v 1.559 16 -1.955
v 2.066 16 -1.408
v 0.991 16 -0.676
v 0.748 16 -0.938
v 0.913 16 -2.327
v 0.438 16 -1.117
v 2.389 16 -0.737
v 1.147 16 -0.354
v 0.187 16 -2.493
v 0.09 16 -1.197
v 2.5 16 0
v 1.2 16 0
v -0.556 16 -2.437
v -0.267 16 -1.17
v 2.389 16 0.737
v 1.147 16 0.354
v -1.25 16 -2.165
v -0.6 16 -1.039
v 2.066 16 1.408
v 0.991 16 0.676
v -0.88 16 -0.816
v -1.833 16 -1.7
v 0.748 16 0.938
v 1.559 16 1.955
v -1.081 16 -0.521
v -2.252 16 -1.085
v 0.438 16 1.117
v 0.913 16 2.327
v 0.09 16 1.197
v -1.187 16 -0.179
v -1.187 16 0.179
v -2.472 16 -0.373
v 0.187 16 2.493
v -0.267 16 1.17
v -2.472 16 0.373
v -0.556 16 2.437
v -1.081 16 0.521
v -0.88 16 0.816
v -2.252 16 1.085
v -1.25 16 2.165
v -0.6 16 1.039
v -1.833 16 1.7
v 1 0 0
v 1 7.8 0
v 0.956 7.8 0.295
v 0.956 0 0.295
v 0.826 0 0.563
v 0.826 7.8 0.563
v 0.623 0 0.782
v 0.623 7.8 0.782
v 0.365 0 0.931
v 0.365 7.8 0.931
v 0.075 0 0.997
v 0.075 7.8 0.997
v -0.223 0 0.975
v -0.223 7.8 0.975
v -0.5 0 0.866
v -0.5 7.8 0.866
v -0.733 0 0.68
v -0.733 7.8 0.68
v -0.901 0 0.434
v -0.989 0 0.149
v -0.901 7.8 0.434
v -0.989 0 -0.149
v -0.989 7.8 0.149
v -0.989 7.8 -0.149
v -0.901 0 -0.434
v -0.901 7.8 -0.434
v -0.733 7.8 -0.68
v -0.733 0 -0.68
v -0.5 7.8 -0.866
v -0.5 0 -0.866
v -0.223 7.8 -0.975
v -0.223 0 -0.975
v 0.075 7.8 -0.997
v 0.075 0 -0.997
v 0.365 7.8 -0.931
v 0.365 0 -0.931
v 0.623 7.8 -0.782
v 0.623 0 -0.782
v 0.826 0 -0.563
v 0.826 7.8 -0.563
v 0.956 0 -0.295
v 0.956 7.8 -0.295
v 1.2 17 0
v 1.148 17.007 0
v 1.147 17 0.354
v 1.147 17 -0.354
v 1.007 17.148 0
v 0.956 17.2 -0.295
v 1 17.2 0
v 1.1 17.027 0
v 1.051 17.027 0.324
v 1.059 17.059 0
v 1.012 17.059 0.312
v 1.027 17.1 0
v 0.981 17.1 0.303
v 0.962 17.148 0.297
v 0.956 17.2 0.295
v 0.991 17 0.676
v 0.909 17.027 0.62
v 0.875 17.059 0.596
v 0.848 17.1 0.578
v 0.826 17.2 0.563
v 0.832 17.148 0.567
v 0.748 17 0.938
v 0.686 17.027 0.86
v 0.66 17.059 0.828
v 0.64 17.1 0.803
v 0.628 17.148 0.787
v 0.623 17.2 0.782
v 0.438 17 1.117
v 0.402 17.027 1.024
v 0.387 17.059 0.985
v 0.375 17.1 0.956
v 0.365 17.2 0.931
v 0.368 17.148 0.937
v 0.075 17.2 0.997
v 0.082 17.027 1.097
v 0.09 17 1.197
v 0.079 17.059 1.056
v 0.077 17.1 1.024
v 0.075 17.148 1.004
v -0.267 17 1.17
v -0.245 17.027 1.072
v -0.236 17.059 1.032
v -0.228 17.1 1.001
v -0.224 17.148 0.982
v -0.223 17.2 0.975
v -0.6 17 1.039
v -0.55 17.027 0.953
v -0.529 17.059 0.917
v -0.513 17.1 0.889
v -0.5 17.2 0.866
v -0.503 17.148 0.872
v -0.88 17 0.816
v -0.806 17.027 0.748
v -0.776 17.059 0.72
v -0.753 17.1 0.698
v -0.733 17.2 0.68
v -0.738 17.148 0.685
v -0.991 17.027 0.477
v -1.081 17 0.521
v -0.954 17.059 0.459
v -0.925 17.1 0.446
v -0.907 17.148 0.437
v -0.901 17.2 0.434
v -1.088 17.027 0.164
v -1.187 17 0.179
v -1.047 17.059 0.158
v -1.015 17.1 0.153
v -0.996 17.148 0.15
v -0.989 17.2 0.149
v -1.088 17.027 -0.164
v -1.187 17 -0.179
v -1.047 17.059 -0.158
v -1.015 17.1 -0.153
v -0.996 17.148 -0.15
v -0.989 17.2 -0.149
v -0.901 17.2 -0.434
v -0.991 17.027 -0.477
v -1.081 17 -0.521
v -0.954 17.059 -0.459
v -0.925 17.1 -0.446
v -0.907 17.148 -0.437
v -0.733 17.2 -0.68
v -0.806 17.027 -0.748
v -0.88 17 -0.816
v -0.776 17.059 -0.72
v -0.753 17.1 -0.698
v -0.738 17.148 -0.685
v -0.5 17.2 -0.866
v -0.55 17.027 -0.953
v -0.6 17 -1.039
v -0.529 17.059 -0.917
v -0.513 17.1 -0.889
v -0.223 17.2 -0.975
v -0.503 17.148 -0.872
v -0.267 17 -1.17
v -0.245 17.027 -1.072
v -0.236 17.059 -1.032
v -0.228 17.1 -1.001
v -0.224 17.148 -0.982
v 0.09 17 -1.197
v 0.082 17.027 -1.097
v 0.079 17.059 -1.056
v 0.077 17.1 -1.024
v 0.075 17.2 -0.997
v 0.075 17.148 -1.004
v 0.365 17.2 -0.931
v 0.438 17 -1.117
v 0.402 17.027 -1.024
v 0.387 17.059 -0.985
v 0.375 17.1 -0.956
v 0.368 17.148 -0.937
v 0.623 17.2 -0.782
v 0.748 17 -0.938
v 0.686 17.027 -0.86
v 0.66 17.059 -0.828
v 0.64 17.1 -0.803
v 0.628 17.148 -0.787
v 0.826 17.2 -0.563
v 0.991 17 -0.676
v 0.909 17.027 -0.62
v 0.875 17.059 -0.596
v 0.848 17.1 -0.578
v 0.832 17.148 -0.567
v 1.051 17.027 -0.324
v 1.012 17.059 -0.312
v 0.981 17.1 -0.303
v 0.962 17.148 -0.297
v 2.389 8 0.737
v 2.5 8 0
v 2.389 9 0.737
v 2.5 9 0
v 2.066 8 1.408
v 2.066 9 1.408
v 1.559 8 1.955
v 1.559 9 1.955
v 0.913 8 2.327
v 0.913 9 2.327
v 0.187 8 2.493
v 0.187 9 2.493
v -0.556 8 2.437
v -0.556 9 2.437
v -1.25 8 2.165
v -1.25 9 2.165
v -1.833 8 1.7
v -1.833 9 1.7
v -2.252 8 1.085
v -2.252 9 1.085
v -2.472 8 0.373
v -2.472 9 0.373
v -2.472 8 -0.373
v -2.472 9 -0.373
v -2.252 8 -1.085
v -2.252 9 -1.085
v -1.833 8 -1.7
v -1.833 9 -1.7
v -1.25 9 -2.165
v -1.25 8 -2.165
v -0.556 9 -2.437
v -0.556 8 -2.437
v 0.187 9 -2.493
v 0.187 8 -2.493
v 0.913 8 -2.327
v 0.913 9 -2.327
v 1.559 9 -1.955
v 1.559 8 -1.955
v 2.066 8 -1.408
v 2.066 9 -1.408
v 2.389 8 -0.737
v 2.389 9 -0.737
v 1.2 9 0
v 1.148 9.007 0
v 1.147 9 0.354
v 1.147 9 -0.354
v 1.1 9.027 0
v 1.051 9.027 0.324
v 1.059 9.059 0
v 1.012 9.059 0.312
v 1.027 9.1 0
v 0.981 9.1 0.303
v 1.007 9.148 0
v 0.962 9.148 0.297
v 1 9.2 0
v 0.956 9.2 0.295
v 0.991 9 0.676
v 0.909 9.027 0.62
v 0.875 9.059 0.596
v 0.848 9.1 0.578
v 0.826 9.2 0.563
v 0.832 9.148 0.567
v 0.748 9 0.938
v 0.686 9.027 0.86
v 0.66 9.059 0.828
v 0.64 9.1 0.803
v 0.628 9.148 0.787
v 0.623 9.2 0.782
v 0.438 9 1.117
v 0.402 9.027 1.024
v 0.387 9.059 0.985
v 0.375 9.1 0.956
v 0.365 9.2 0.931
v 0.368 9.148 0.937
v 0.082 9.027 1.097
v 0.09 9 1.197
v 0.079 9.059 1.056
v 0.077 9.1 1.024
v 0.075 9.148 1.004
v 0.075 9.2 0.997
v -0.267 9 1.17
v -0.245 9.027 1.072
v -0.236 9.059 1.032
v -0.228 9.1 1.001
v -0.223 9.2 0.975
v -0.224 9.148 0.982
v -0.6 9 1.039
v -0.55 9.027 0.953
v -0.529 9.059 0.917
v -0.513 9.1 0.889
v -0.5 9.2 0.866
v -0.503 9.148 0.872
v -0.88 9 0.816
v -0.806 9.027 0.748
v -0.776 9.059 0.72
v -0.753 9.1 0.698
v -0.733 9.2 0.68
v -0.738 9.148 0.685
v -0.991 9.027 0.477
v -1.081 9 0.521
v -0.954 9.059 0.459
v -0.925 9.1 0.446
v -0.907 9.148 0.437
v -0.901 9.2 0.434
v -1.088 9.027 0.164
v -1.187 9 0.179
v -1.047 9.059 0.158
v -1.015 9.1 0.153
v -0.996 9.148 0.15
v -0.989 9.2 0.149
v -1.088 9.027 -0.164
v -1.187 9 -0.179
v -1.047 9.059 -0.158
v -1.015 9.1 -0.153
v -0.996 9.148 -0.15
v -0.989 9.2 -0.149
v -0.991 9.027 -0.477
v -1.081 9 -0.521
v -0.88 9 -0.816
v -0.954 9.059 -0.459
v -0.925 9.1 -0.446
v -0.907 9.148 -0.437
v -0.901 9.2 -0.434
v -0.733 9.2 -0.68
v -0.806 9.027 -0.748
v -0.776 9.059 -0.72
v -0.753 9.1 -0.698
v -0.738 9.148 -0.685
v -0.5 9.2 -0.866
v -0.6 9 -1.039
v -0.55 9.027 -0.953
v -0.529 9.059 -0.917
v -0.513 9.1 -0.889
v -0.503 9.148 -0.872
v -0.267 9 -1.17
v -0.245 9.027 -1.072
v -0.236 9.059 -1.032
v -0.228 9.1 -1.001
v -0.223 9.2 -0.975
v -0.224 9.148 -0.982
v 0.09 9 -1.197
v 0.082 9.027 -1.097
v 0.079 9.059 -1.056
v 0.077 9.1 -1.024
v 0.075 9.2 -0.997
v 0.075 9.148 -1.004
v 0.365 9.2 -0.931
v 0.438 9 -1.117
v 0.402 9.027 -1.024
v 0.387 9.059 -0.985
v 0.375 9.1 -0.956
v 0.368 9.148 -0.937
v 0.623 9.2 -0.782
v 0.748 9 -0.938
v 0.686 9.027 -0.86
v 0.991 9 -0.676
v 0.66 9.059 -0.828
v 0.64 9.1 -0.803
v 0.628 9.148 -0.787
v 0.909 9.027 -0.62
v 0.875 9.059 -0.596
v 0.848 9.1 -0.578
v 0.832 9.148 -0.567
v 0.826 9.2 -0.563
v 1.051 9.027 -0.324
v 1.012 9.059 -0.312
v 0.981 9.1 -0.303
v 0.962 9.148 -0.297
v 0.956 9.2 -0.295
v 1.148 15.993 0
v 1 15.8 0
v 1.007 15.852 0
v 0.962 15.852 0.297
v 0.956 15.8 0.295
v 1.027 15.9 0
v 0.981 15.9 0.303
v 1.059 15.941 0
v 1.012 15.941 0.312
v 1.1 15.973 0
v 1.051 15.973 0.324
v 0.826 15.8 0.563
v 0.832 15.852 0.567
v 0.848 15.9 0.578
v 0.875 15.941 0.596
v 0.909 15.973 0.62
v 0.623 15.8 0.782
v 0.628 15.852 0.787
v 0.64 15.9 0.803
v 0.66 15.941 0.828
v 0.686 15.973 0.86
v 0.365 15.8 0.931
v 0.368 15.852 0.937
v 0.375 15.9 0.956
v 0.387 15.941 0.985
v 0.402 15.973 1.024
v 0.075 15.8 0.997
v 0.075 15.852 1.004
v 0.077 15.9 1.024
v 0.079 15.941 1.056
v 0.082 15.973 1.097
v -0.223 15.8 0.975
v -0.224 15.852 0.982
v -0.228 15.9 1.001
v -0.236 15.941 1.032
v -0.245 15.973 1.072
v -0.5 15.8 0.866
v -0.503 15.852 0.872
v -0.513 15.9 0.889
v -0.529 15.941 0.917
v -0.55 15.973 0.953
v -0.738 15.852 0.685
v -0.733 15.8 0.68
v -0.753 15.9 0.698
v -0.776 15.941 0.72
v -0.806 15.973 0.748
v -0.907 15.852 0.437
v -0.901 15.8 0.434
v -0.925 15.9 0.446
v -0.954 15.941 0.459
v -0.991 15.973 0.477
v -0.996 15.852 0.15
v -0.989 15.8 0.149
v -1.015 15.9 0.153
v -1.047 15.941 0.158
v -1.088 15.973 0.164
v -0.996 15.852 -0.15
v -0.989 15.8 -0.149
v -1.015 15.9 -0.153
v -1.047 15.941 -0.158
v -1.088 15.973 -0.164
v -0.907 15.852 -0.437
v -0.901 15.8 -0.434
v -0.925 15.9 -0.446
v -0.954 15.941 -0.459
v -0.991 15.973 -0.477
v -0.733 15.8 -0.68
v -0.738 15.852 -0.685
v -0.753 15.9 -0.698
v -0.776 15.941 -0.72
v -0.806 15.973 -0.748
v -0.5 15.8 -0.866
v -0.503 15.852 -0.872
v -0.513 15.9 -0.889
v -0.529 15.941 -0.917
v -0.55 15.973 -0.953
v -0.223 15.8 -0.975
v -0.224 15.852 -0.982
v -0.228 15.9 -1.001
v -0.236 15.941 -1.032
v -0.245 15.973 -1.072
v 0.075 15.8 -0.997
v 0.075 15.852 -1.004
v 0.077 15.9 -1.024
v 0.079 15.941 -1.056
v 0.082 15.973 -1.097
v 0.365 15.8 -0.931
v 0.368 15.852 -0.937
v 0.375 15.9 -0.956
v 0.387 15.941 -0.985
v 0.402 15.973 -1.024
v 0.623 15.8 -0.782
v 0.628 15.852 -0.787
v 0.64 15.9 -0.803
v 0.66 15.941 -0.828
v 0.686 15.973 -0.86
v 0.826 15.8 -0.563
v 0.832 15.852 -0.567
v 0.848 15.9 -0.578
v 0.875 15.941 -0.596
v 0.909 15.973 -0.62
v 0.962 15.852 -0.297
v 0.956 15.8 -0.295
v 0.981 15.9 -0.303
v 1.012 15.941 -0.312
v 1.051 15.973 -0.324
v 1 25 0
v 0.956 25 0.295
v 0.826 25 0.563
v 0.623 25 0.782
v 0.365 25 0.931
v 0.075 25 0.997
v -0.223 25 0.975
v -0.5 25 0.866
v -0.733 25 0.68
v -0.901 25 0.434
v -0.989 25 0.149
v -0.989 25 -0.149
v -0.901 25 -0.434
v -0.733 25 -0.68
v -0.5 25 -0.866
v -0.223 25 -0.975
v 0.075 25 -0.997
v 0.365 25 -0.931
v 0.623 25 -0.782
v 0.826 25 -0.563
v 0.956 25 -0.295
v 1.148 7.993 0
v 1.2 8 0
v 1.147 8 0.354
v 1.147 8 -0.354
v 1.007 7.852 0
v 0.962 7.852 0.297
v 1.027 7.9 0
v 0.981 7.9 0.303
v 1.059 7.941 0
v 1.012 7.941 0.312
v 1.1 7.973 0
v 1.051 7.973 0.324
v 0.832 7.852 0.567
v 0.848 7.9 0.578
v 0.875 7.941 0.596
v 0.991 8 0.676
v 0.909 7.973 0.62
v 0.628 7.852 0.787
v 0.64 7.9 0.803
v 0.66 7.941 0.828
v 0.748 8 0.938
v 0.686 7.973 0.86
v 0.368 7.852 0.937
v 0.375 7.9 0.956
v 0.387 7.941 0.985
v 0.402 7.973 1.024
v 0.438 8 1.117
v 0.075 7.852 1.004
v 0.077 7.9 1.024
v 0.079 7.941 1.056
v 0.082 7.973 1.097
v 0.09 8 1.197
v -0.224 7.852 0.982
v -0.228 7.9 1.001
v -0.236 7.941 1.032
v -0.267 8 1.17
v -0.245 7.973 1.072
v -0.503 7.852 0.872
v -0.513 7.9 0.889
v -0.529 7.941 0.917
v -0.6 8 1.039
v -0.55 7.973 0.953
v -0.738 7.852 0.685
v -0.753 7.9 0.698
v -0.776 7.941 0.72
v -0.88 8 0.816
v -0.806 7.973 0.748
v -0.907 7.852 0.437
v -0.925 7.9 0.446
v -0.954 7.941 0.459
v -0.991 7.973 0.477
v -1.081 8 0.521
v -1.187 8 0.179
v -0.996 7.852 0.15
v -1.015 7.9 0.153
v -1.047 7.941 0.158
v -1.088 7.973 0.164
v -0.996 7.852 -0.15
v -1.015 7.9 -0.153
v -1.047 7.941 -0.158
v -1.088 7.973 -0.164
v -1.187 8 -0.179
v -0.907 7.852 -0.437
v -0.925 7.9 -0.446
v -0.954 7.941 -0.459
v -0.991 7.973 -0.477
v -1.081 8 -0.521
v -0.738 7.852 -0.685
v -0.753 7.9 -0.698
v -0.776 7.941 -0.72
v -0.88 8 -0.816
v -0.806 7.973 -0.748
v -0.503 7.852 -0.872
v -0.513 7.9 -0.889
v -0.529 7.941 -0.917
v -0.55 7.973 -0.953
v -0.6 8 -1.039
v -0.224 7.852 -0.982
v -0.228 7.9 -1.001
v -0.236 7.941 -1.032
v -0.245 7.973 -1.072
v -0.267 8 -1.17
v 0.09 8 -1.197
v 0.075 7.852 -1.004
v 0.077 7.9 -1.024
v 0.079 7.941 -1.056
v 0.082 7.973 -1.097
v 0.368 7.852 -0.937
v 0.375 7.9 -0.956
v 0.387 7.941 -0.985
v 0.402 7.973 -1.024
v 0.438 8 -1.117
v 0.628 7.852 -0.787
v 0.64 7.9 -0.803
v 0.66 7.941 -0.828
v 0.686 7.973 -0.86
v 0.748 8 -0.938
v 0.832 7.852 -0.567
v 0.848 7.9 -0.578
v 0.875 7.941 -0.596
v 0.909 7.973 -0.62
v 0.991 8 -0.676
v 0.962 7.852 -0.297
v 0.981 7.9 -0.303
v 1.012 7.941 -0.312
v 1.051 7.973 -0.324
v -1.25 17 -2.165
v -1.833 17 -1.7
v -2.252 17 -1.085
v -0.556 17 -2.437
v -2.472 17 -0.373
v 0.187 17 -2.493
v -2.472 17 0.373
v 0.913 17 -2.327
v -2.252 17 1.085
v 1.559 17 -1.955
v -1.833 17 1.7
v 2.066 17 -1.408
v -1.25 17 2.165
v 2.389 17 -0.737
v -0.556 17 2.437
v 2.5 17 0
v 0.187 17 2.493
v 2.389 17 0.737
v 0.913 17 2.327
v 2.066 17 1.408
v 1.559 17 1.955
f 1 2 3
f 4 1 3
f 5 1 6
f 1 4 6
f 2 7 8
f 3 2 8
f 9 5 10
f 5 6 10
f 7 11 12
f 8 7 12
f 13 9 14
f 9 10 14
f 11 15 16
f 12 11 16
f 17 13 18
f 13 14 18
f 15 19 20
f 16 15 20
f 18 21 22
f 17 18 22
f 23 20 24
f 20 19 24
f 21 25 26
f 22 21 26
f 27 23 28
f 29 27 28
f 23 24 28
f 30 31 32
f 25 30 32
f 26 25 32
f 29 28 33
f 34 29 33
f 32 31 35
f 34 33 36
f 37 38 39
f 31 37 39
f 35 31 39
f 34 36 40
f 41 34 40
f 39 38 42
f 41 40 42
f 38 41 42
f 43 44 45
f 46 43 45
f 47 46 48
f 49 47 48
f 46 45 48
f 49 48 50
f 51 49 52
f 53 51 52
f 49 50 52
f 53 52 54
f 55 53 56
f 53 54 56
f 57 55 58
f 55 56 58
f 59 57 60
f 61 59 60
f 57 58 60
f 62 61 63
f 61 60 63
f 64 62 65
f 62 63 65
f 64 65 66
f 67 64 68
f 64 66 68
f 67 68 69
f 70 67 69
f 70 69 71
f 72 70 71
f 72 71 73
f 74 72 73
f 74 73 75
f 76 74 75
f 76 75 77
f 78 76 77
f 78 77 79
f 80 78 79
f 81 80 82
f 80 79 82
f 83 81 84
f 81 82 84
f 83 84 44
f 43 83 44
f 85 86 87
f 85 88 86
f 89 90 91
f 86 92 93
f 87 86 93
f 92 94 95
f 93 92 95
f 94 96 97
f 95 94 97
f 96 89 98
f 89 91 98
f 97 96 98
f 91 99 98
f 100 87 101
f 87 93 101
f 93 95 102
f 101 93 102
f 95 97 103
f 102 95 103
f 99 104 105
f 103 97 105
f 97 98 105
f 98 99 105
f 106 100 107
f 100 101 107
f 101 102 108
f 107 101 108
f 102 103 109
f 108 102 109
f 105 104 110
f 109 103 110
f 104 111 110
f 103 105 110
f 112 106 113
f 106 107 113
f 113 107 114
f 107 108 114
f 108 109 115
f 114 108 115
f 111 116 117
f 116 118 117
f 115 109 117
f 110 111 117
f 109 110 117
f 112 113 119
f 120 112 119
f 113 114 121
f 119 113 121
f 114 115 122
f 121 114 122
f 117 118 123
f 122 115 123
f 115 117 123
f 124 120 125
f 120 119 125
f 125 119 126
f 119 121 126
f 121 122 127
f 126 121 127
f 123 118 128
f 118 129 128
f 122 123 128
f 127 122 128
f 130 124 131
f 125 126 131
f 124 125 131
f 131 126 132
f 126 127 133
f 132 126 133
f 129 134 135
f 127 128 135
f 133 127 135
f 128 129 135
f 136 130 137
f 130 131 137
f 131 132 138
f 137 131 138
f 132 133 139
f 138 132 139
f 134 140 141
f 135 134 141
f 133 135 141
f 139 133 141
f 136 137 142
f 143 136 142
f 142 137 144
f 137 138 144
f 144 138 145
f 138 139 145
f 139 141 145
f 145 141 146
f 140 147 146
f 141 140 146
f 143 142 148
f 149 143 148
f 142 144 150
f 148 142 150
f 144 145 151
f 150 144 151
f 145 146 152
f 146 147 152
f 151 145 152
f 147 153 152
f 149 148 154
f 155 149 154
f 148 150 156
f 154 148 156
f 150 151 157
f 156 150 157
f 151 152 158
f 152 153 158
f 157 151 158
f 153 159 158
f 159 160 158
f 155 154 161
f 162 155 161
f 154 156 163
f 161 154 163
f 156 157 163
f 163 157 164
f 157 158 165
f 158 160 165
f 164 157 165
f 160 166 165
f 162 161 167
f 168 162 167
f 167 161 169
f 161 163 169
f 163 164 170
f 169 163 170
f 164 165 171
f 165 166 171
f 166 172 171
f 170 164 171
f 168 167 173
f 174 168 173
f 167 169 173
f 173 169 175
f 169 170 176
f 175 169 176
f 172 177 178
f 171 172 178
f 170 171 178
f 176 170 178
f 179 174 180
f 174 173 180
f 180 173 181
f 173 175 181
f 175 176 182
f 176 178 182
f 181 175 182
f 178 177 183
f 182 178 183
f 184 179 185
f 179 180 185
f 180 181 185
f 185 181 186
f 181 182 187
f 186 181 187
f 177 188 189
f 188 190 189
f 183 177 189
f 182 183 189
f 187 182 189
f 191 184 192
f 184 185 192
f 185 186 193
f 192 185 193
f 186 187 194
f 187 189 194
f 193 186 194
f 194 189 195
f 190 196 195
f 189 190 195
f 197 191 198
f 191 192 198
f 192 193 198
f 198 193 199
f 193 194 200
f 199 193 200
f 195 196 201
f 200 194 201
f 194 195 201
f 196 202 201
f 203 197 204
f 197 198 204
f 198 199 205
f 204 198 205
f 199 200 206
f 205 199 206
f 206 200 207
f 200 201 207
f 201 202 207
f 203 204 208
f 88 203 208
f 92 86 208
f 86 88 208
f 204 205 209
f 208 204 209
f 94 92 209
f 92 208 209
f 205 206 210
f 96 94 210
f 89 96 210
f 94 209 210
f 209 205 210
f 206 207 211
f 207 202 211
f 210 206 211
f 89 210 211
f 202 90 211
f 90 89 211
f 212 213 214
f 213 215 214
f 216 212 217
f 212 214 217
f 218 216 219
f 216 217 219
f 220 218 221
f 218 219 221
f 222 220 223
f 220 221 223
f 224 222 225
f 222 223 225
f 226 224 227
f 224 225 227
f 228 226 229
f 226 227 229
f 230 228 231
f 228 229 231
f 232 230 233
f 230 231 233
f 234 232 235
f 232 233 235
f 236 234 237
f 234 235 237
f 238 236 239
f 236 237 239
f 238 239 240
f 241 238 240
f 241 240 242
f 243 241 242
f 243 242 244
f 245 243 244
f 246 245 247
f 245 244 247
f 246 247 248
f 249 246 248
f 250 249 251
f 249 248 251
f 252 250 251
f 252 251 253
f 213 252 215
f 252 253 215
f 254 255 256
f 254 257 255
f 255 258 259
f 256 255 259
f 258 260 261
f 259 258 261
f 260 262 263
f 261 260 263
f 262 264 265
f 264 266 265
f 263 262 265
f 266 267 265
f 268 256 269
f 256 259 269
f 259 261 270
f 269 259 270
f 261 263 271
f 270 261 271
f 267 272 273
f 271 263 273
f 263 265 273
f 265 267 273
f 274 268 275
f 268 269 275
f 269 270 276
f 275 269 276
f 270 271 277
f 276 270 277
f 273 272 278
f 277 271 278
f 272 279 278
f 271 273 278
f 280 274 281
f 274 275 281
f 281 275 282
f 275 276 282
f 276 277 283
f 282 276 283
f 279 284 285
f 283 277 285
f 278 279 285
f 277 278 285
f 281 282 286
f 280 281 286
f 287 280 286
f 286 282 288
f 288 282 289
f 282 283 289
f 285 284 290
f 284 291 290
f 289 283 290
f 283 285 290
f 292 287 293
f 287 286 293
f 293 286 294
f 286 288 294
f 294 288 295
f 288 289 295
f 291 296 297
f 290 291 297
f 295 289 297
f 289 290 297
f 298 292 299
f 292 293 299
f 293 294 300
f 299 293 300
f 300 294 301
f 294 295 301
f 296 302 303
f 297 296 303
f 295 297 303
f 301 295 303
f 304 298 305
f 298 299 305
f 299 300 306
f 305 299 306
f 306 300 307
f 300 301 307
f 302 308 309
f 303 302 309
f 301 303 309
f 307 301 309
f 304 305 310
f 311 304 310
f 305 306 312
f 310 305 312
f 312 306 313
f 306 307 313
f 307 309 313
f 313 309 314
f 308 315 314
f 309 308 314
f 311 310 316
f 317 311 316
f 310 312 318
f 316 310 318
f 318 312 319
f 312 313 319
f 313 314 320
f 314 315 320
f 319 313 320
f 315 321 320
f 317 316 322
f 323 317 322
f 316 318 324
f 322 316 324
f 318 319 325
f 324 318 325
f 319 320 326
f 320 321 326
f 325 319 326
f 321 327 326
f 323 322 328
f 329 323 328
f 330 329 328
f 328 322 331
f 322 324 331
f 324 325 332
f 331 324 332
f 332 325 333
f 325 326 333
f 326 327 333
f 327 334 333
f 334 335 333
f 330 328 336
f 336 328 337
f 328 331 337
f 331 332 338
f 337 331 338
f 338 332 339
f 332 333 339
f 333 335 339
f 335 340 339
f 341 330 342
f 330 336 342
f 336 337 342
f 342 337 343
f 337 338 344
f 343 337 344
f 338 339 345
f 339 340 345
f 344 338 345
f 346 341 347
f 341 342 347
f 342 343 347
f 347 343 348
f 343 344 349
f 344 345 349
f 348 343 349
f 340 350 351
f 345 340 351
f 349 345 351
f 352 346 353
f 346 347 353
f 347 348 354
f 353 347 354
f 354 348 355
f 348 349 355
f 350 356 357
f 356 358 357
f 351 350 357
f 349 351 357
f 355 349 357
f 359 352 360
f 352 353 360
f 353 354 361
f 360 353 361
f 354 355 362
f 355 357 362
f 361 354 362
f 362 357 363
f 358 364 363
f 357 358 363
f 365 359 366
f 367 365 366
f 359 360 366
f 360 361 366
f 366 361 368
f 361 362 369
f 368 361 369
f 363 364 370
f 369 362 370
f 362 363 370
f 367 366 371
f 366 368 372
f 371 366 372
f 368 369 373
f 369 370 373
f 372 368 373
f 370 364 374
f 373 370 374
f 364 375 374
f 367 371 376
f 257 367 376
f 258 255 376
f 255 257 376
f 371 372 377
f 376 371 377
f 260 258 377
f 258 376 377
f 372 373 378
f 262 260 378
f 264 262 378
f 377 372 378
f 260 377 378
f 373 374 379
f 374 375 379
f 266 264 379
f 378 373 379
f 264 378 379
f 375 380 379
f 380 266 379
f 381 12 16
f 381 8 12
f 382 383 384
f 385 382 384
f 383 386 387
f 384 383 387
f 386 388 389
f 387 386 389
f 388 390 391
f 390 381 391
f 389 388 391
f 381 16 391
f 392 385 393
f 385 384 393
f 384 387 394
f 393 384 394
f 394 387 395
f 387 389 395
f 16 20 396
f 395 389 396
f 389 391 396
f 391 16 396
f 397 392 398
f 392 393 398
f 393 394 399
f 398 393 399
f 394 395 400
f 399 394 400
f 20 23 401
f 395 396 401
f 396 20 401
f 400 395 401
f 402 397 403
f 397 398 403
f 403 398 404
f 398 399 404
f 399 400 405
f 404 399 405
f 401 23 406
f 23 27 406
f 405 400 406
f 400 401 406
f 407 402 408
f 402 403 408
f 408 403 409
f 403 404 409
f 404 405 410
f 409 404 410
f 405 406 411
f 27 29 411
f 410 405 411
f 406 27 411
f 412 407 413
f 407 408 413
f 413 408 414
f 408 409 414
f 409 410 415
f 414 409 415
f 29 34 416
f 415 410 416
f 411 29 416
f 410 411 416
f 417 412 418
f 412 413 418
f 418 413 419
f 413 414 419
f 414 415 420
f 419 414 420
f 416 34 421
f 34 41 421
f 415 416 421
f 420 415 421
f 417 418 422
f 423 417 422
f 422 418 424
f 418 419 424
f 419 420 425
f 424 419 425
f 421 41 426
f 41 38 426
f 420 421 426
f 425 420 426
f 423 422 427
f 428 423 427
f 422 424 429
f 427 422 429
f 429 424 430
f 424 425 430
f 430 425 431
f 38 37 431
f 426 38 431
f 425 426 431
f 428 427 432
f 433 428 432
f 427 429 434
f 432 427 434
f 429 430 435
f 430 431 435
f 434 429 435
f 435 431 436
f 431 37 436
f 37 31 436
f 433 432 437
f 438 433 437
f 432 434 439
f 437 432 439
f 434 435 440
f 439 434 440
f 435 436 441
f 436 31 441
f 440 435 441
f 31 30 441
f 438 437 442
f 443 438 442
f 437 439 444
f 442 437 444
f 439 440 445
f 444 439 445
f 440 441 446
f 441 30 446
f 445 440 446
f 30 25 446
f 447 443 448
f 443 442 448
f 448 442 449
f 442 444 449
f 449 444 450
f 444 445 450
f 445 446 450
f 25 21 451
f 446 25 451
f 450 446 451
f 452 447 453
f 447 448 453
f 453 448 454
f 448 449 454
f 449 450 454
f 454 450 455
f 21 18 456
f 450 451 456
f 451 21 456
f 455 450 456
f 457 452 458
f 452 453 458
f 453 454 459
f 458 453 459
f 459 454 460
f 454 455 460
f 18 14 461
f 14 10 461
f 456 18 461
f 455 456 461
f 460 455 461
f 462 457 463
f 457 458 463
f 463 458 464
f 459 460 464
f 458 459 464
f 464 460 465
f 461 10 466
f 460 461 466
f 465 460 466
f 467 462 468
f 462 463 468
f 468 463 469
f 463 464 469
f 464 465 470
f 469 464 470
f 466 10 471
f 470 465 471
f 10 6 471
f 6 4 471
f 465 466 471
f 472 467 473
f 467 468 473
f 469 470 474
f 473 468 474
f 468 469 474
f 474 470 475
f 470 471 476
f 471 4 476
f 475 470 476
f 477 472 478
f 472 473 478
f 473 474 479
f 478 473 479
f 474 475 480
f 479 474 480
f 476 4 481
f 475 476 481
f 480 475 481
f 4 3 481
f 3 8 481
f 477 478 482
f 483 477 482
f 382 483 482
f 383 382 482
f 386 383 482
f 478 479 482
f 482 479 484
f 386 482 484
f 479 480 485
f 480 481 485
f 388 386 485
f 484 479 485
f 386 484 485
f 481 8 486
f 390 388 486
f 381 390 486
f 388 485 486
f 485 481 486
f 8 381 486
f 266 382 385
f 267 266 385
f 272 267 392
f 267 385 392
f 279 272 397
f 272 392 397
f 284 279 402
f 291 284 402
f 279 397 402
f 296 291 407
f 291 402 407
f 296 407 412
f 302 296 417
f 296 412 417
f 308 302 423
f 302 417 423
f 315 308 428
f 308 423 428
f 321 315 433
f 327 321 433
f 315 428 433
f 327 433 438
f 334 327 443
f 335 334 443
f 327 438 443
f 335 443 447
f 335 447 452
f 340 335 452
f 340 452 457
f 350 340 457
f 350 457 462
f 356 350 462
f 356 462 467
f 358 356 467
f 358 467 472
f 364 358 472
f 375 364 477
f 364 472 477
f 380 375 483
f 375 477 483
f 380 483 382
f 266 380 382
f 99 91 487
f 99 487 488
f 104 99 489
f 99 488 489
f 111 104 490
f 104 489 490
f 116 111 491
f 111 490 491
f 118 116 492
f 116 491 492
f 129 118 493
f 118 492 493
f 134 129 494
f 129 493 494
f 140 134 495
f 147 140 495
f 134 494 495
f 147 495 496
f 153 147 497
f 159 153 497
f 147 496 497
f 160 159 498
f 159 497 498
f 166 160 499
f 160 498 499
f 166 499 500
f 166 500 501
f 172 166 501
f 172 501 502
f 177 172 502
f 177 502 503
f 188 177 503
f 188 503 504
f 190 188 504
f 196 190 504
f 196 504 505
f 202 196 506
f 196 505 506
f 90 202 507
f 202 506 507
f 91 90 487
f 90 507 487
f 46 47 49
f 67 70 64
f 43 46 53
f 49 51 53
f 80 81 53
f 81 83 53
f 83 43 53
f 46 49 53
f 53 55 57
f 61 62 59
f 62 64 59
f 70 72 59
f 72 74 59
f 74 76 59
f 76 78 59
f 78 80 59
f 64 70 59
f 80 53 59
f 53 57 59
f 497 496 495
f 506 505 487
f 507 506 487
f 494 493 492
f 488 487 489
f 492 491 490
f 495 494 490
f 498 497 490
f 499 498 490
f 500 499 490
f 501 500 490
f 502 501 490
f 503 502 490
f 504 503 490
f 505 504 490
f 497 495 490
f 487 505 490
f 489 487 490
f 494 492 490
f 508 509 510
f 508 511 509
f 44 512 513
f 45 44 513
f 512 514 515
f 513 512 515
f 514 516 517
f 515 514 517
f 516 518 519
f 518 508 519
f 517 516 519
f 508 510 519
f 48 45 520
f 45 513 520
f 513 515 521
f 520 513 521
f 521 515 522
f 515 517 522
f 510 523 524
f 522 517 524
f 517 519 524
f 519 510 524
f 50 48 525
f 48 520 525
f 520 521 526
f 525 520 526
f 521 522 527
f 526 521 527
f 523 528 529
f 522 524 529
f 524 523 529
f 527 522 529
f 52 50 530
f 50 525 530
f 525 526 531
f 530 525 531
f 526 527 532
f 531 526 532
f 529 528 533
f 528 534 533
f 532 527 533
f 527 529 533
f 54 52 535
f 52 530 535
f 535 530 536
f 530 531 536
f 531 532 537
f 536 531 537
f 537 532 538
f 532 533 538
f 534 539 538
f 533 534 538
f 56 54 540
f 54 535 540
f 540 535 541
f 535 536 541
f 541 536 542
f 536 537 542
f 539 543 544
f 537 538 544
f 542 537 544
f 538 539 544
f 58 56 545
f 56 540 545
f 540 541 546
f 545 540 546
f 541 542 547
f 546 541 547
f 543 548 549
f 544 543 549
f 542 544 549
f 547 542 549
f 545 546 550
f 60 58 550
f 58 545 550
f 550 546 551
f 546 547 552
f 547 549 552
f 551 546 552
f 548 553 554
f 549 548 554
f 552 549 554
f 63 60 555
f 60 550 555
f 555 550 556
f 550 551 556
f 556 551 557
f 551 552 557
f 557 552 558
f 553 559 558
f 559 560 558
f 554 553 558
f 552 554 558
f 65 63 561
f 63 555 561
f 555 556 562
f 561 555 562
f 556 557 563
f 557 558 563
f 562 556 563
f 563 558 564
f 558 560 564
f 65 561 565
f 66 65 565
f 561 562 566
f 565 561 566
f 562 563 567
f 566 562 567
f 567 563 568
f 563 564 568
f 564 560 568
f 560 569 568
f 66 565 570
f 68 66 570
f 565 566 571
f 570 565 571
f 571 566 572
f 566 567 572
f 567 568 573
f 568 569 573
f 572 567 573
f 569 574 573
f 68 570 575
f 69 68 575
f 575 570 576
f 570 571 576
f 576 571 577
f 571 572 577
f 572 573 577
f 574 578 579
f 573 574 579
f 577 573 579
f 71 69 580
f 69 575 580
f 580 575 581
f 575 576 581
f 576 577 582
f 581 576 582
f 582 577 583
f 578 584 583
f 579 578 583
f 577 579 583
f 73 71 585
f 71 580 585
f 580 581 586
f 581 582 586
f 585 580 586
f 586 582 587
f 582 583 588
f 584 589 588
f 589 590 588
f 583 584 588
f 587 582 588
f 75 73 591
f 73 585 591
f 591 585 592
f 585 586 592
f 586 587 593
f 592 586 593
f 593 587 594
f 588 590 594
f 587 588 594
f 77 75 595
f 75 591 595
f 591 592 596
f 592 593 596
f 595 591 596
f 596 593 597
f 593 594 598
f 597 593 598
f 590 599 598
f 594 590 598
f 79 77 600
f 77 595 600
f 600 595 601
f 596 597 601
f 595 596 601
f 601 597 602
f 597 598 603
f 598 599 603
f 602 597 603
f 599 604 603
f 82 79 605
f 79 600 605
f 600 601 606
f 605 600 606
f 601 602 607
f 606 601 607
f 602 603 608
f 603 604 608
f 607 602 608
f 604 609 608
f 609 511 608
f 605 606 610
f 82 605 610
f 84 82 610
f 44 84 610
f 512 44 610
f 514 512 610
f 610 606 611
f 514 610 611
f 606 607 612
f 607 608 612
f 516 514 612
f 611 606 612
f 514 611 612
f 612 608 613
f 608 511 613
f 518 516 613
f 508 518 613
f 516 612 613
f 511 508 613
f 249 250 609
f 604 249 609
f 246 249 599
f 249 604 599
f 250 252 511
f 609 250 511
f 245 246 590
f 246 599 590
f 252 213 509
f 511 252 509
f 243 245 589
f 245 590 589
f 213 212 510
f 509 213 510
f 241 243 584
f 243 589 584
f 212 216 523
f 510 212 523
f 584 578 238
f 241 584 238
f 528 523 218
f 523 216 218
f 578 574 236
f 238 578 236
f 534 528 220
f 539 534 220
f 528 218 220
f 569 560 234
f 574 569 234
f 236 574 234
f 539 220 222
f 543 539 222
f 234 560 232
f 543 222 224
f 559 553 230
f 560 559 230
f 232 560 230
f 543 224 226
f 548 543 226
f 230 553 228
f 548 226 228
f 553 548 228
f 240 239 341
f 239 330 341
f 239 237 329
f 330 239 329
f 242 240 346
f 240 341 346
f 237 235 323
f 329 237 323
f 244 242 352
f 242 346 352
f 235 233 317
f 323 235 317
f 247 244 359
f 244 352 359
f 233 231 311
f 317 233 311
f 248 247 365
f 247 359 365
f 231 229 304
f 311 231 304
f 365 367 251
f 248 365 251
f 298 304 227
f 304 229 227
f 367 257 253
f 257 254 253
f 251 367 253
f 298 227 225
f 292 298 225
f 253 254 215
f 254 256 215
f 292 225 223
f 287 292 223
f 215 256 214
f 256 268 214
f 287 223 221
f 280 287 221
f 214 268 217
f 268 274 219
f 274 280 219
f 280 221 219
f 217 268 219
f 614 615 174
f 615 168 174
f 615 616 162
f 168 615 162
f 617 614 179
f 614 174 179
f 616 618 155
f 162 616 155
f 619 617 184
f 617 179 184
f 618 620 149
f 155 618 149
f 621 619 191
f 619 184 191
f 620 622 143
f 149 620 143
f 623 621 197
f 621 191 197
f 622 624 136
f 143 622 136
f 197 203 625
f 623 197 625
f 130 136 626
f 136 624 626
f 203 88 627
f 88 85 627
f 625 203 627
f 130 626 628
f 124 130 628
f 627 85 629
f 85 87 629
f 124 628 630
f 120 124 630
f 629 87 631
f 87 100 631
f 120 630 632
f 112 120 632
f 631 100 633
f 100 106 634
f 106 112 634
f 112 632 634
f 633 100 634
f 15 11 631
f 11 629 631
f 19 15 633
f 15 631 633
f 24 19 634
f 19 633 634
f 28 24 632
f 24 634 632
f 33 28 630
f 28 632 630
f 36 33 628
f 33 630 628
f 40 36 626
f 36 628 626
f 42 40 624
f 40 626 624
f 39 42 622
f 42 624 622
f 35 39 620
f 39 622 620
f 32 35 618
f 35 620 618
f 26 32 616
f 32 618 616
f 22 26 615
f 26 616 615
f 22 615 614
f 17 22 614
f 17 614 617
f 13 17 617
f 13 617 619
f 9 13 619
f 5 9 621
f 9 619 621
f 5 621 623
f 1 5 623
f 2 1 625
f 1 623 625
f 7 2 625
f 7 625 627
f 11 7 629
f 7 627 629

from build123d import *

# Parameters (mm, degrees)
FILLET1_R = 0.2


with BuildPart() as part:
    # Sketch1 → Revolve1 (revolve)
    with BuildSketch(Plane.XY):
        Polygon((0, 0), (1, 0), (1, 8), (2.5, 8), (2.5, 9), (1, 9), (1, 16), (2.5, 16), (2.5, 17), (1, 17), (1, 25), (0, 25), align=None)
    revolve(axis=Axis((0, 25, 0), (0, -1, 0)))

    # Fillet1
    fillet1_edges = [part.edges().sort_by_distance(p)[0] for p in [
        (-1, 17, 0),
        (-1, 16, 0),
        (-1, 9, 0),
        (-1, 8, 0),
    ]]
    fillet(fillet1_edges, radius=FILLET1_R)


solid = part.part
